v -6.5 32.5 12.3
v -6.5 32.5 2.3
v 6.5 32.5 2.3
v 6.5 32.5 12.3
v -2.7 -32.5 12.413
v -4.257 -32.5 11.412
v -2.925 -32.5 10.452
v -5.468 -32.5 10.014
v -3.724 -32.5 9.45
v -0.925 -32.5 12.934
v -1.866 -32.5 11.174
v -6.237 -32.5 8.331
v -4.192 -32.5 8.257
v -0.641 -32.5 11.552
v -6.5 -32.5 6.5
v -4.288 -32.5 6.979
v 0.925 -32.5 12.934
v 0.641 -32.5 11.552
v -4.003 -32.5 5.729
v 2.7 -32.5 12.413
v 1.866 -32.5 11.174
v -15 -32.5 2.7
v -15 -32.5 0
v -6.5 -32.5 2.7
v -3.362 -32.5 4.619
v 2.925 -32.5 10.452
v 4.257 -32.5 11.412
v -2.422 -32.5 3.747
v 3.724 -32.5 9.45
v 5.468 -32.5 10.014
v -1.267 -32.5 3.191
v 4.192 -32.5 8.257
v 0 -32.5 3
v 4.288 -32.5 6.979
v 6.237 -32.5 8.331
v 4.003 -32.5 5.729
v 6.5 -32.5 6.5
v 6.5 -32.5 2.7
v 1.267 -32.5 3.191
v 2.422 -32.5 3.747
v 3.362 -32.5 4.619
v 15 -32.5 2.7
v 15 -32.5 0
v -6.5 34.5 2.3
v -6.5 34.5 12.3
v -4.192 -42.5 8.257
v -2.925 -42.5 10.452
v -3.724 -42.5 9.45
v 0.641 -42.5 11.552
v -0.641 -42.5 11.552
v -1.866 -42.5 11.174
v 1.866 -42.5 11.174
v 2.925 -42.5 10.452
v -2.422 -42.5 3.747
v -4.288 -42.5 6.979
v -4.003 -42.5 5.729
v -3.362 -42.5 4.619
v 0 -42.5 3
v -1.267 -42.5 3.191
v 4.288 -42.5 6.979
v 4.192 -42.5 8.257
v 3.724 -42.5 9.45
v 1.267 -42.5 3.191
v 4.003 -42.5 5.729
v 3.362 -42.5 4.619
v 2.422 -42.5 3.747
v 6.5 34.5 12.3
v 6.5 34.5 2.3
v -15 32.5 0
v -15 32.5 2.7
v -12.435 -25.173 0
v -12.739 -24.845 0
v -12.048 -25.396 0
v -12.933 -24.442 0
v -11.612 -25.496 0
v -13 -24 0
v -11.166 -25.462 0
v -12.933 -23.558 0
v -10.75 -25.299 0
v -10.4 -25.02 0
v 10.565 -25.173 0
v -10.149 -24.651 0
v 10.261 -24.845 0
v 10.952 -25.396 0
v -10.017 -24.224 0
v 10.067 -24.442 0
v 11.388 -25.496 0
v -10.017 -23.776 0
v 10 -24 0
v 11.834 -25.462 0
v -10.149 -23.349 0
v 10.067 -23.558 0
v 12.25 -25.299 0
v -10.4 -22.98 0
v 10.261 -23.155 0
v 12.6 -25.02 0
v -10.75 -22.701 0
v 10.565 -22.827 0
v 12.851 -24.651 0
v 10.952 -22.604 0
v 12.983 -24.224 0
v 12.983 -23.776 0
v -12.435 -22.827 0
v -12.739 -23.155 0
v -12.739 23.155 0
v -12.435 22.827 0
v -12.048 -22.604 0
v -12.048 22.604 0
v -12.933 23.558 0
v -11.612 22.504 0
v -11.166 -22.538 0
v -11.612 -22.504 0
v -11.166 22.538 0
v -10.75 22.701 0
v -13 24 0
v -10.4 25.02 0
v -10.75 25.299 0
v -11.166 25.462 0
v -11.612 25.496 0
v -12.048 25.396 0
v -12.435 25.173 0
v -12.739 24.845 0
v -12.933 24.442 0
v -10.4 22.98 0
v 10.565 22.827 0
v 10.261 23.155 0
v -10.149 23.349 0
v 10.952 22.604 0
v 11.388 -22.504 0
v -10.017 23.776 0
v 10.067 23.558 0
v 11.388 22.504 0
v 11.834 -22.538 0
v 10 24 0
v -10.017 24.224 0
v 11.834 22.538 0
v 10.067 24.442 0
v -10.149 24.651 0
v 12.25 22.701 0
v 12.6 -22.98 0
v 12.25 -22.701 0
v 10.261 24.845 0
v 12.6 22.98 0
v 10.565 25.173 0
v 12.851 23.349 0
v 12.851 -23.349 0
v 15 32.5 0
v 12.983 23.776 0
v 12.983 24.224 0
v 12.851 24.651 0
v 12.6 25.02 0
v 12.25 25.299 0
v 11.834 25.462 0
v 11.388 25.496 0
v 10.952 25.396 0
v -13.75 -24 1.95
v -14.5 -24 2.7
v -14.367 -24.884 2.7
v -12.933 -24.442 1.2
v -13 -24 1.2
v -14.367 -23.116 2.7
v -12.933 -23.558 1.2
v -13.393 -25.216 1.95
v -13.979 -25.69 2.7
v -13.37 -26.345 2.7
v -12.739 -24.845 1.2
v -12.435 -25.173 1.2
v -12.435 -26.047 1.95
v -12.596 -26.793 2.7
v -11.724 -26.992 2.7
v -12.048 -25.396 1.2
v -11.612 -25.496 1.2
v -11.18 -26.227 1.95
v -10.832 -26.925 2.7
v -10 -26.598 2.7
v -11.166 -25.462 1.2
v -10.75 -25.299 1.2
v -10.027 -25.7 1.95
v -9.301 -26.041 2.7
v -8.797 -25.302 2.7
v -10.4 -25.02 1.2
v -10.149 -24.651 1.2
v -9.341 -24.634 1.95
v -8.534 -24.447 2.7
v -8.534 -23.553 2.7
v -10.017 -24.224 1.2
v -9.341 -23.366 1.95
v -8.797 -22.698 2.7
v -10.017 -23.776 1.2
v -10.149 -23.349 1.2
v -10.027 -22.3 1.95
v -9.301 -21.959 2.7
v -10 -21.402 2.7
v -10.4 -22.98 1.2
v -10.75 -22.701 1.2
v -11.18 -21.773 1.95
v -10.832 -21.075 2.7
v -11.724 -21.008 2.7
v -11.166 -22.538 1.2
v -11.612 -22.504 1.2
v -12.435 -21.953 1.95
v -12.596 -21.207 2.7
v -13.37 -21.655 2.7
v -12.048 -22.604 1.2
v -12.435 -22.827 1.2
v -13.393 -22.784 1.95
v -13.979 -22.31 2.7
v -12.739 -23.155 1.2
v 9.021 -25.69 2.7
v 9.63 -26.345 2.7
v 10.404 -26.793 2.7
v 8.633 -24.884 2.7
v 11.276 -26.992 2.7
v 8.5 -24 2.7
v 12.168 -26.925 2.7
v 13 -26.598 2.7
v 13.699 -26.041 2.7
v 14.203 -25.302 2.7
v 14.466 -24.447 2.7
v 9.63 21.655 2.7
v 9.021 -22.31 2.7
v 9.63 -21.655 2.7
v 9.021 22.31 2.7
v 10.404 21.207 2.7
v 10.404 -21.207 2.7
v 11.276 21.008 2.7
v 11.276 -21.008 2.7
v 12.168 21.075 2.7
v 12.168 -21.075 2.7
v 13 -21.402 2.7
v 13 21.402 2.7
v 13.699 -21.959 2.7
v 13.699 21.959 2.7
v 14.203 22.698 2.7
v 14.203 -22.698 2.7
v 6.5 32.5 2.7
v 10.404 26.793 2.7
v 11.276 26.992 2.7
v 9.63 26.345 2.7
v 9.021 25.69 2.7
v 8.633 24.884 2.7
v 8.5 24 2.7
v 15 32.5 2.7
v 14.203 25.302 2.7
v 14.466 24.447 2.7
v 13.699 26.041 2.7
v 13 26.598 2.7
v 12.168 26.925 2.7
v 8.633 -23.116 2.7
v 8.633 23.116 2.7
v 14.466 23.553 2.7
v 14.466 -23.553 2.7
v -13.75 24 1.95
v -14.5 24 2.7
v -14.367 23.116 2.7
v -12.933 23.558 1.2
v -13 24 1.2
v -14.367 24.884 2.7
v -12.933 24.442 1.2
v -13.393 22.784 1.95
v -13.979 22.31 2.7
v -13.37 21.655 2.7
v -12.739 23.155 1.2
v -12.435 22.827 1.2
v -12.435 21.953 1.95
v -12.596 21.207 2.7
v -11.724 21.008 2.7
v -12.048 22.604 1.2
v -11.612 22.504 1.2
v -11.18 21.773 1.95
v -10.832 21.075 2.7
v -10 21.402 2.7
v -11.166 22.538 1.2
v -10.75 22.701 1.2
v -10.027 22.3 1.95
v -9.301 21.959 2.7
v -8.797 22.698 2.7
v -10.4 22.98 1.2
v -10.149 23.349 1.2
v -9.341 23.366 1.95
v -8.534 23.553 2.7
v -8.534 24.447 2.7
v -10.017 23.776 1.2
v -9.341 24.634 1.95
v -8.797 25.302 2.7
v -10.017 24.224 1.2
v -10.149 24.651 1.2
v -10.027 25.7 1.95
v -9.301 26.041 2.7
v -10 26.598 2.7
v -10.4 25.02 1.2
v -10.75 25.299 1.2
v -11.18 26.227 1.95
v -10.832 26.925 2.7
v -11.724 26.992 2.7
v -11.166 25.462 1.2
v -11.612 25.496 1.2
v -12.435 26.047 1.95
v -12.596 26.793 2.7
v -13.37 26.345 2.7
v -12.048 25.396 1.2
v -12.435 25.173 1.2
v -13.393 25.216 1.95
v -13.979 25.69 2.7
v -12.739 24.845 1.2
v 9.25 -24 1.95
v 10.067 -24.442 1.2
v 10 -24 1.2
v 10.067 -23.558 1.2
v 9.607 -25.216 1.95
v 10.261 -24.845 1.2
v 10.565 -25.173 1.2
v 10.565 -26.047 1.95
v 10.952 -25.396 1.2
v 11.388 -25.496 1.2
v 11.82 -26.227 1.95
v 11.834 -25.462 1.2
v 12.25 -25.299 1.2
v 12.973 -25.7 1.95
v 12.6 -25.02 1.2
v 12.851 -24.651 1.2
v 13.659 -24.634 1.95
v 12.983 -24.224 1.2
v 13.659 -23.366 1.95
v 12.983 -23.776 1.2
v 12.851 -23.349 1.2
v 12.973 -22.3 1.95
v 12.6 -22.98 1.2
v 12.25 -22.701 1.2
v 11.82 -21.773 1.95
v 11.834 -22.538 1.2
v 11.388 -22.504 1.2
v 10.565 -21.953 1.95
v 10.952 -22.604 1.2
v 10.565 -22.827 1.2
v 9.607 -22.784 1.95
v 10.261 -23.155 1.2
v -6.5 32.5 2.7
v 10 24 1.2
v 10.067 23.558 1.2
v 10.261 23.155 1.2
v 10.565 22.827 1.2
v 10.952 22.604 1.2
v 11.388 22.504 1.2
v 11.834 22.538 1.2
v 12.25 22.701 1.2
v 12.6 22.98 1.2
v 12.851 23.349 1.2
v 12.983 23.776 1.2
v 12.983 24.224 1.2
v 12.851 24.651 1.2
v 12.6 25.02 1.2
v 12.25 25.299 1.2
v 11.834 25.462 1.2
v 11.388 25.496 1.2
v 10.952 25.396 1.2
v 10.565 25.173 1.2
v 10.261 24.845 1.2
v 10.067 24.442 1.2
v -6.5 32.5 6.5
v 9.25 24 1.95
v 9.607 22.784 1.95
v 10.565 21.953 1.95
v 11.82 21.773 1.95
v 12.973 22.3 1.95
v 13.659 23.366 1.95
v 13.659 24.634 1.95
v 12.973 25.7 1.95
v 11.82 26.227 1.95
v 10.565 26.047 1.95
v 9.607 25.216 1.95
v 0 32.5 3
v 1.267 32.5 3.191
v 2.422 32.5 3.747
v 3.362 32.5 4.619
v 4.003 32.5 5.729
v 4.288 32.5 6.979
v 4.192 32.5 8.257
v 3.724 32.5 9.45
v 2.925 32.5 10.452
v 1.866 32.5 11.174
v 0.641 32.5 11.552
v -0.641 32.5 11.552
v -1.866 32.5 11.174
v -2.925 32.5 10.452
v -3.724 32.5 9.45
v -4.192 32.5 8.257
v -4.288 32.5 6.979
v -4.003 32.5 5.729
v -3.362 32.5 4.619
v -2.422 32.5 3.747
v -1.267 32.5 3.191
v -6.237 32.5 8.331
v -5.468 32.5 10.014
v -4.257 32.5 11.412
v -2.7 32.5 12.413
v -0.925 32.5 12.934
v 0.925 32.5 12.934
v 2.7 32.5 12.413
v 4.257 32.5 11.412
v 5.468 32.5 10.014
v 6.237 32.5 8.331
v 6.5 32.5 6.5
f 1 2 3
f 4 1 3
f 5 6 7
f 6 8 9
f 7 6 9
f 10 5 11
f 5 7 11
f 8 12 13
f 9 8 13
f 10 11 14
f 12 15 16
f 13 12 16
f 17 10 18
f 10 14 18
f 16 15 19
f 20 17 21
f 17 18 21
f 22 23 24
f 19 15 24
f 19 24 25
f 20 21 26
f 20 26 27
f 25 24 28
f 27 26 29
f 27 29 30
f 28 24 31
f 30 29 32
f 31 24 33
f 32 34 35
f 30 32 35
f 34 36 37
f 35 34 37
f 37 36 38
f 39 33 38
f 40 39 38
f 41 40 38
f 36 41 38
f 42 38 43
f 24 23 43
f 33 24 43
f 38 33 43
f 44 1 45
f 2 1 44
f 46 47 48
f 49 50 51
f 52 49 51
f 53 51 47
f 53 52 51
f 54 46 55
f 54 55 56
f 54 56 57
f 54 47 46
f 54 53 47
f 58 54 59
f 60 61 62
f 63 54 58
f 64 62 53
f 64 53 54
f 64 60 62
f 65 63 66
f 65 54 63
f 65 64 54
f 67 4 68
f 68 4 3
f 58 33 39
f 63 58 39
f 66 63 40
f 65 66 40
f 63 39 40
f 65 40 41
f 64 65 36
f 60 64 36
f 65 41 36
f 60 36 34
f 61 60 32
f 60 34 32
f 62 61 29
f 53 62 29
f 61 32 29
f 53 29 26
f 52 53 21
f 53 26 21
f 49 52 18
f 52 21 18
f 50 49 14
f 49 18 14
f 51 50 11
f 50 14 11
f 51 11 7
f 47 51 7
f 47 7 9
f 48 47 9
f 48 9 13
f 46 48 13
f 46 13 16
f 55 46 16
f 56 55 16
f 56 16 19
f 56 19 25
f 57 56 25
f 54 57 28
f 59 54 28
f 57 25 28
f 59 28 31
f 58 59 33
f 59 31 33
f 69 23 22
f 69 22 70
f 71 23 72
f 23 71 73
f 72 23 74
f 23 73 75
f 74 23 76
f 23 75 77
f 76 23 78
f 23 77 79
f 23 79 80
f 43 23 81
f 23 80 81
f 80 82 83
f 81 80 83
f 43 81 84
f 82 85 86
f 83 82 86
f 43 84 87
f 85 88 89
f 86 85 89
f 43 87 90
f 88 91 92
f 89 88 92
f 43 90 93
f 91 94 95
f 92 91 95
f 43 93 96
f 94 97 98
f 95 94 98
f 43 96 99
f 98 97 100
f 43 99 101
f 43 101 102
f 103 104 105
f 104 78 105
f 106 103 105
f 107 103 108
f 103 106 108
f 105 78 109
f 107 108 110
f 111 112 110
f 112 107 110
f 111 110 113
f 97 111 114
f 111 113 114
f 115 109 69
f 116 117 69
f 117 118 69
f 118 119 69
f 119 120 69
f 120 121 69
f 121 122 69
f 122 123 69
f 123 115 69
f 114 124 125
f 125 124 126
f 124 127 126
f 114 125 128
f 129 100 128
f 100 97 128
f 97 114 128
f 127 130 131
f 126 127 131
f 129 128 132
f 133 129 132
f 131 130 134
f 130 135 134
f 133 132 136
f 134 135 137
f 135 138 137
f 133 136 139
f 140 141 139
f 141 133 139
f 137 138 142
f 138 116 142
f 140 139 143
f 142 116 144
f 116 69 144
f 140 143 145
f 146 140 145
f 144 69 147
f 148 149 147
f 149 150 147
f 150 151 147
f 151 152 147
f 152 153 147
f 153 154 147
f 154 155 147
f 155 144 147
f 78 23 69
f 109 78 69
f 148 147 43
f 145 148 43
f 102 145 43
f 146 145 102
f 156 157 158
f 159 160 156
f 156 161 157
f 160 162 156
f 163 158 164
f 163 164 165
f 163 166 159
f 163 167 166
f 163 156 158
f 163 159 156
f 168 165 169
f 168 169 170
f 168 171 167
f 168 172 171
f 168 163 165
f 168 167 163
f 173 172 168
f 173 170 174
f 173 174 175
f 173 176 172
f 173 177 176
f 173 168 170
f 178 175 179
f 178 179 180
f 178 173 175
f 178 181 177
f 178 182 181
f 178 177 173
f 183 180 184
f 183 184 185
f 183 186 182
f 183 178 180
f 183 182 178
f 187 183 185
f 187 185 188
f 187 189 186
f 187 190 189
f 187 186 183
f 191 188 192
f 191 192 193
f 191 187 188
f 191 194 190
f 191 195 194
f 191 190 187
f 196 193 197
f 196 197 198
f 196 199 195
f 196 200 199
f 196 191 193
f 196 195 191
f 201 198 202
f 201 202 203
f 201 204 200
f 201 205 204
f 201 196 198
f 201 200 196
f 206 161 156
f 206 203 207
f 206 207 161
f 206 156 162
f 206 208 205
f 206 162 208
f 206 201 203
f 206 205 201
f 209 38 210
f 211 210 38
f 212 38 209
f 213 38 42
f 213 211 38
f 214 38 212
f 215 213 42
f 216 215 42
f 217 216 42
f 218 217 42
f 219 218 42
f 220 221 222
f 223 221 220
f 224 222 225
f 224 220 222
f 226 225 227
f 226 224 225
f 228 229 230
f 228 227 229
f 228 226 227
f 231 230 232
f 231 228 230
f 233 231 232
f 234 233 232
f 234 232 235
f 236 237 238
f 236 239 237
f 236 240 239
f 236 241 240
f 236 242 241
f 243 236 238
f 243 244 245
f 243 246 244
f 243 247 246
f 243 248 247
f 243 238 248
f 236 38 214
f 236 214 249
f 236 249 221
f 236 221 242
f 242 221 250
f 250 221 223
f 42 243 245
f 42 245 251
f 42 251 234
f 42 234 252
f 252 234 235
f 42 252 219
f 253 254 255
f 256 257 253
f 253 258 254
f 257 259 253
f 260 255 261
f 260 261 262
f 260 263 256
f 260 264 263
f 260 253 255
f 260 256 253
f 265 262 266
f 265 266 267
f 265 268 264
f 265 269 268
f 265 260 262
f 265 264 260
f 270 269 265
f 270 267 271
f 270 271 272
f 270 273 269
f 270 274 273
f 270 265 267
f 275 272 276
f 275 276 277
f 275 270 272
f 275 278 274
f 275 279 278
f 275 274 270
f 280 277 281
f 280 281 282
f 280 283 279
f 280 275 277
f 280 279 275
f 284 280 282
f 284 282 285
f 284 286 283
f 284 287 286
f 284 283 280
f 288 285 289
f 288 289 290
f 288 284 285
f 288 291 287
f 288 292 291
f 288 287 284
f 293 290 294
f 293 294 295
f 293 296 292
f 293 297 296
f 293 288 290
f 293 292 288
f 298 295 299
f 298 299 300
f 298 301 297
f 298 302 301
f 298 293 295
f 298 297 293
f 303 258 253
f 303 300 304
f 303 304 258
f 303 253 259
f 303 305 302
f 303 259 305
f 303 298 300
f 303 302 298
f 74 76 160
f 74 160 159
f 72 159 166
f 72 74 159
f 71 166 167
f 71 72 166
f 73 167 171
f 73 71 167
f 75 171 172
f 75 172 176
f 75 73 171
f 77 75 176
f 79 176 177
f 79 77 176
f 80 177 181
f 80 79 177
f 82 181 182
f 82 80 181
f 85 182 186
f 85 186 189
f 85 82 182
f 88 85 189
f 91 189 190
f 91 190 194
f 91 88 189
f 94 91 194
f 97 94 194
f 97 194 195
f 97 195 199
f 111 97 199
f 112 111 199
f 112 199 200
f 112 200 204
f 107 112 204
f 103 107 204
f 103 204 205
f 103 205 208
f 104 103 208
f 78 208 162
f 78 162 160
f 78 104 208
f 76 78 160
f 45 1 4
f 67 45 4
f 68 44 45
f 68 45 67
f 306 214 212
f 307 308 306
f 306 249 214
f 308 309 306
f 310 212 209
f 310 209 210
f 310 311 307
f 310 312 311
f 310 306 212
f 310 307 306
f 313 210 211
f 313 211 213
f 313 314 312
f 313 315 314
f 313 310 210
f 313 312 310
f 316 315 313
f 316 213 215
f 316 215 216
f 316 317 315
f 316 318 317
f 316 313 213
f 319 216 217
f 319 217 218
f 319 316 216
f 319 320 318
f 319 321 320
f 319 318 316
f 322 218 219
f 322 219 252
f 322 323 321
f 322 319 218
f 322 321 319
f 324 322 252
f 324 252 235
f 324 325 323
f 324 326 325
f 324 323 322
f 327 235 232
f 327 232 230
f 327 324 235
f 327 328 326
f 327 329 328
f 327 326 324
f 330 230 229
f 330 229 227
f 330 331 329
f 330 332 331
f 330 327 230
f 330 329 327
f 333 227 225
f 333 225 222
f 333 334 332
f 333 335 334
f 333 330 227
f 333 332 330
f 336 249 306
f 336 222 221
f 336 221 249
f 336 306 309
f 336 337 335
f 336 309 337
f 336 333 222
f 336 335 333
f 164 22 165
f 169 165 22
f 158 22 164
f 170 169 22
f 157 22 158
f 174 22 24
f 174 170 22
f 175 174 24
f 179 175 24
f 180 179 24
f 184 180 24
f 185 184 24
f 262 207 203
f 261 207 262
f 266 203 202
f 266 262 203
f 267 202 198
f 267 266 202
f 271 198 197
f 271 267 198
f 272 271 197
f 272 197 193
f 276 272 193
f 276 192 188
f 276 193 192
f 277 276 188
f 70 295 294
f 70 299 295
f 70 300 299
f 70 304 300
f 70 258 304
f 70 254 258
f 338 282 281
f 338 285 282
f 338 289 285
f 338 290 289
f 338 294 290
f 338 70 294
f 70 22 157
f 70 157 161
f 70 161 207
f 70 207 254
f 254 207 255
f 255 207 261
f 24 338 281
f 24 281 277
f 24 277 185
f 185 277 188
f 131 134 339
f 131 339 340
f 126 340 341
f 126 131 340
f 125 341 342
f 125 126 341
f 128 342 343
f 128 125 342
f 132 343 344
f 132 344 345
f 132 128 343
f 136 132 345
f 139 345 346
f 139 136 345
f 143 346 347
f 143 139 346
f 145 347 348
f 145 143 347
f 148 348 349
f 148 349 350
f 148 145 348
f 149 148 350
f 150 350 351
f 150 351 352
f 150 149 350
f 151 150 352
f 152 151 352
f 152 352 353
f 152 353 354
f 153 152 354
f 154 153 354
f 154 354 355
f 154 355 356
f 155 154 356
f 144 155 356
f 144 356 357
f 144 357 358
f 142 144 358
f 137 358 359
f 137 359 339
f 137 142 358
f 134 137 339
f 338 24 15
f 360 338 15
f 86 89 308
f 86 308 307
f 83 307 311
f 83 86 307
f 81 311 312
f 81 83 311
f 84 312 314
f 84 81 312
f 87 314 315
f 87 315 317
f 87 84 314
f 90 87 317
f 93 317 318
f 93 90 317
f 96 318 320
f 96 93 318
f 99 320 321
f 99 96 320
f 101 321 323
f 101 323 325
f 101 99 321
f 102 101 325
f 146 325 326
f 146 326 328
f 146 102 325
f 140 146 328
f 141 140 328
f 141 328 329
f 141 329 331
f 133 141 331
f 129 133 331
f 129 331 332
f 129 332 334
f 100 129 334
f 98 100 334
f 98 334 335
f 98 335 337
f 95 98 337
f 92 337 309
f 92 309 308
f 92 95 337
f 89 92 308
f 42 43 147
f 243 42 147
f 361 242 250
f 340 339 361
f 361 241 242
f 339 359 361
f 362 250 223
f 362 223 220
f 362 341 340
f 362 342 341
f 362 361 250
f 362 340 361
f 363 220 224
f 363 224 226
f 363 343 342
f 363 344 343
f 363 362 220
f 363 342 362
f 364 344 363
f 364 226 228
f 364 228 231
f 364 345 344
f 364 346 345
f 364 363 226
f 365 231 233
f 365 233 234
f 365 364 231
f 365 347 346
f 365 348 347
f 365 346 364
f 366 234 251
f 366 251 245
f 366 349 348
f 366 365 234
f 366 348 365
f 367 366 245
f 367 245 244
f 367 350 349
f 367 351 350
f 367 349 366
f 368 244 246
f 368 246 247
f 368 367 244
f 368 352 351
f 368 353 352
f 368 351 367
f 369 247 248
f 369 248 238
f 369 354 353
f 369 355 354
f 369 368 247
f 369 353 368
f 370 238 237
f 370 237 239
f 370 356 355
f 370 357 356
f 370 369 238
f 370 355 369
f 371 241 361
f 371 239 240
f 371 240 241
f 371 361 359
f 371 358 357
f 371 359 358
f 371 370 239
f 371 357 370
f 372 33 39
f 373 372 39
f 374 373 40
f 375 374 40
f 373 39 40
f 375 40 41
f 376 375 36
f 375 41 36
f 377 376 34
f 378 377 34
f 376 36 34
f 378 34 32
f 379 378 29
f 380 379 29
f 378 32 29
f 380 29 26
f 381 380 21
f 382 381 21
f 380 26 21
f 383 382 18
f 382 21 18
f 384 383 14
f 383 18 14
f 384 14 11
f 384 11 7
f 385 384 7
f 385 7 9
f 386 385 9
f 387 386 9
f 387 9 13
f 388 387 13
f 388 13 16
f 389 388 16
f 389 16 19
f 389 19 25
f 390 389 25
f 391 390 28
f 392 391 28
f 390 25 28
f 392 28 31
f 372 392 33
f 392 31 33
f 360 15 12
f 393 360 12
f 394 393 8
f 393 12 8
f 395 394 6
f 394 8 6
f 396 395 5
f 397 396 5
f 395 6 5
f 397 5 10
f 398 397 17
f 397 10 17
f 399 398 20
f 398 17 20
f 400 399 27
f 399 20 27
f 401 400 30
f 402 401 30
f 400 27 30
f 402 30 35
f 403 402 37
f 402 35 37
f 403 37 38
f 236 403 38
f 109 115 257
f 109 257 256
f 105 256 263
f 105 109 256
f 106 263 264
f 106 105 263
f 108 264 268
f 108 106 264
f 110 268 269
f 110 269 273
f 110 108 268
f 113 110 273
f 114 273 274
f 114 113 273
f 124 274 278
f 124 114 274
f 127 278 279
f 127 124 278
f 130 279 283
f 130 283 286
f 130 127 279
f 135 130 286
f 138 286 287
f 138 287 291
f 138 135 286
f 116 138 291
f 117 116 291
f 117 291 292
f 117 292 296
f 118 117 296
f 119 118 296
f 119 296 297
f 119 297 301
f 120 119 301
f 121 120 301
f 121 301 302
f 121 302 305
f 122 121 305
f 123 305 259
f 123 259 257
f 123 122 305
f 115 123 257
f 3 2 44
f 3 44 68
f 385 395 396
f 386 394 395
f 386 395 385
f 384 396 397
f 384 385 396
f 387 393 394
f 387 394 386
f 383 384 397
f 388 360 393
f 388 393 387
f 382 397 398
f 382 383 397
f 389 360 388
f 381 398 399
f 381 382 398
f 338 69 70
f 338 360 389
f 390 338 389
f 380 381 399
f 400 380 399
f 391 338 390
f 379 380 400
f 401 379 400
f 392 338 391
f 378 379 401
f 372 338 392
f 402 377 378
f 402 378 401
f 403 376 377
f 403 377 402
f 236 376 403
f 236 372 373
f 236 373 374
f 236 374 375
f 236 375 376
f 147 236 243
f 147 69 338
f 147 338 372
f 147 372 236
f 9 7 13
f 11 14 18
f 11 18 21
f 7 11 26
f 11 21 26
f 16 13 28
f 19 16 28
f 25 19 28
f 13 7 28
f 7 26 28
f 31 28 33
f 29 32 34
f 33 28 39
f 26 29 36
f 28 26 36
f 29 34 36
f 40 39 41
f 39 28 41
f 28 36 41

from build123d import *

# Parameters (mm, degrees)
SKETCH_1_W      = 30
SKETCH_1_H      = 65
SKETCH_1_R      = 1.5
EXTRUDE_1_DEPTH = 2.7
SKETCH_2_R      = 4.3
EXTRUDE_2_DEPTH = 65
SKETCH_3_R      = 4.3
EXTRUDE_3_DEPTH = 10
SKETCH_4_W      = 13
SKETCH_4_H      = 10
EXTRUDE_4_DEPTH = 2
CHAMFER_1_SIZE  = 1.5


with BuildPart() as part:
    # 草图1 → 凸台-拉伸1 (new body)
    with BuildSketch(Plane.XY):
        Rectangle(SKETCH_1_W, SKETCH_1_H)
        with Locations(Location((-11.5, 24, 0), (0, 0, 180))):
            Circle(SKETCH_1_R, mode=Mode.SUBTRACT)
        with Locations(Location((11.5, 24, 0), (0, 0, 180))):
            Circle(SKETCH_1_R, mode=Mode.SUBTRACT)
        with Locations(Location((11.5, -24, 0), (0, 0, 180))):
            Circle(SKETCH_1_R, mode=Mode.SUBTRACT)
        with Locations(Location((-11.5, -24, 0), (0, 0, 180))):
            Circle(SKETCH_1_R, mode=Mode.SUBTRACT)
    extrude(amount=EXTRUDE_1_DEPTH)

    # 草图2 → 凸台-拉伸2 (add)
    with BuildSketch(Plane.XZ.offset(32.5)):
        with BuildLine():
            Line((-6.5, 2.7), (-6.5, 6.5))
            ThreePointArc((-6.5, 6.5), (0, 13), (6.5, 6.5))
            Line((6.5, 6.5), (6.5, 2.7))
            Line((6.5, 2.7), (-6.5, 2.7))
        make_face()
        with Locations(Location((0, 7.3, 0), (0, 0, 270))):
            Circle(SKETCH_2_R, mode=Mode.SUBTRACT)
    extrude(amount=-EXTRUDE_2_DEPTH)

    # 倒角1
    chamfer_1_edges = [part.edges().sort_by_distance(p)[0] for p in [
        (-10, 24, 2.7),
        (13, 24, 2.7),
        (13, -24, 2.7),
        (-10, -24, 2.7),
    ]]
    chamfer(chamfer_1_edges, length=CHAMFER_1_SIZE)


with BuildPart() as body_2:
    # 草图3 → 凸台-拉伸3 (new body)
    with BuildSketch(Plane.XZ.offset(32.5)):
        with Locations(Location((0, 7.3, 0), (0, 0, 270))):
            Circle(SKETCH_3_R)
    extrude(amount=EXTRUDE_3_DEPTH)


with BuildPart() as body_3:
    # 草图4 → 凸台-拉伸4 (new body)
    with BuildSketch(Plane(origin=(0, 32.5, 0), x_dir=(1, 0, 0), z_dir=(0, 1, 0))):
        with Locations((0, -7.3)):
            Rectangle(SKETCH_4_W, SKETCH_4_H)
    extrude(amount=EXTRUDE_4_DEPTH)


solid = Compound([part.part, body_2.part, body_3.part])
